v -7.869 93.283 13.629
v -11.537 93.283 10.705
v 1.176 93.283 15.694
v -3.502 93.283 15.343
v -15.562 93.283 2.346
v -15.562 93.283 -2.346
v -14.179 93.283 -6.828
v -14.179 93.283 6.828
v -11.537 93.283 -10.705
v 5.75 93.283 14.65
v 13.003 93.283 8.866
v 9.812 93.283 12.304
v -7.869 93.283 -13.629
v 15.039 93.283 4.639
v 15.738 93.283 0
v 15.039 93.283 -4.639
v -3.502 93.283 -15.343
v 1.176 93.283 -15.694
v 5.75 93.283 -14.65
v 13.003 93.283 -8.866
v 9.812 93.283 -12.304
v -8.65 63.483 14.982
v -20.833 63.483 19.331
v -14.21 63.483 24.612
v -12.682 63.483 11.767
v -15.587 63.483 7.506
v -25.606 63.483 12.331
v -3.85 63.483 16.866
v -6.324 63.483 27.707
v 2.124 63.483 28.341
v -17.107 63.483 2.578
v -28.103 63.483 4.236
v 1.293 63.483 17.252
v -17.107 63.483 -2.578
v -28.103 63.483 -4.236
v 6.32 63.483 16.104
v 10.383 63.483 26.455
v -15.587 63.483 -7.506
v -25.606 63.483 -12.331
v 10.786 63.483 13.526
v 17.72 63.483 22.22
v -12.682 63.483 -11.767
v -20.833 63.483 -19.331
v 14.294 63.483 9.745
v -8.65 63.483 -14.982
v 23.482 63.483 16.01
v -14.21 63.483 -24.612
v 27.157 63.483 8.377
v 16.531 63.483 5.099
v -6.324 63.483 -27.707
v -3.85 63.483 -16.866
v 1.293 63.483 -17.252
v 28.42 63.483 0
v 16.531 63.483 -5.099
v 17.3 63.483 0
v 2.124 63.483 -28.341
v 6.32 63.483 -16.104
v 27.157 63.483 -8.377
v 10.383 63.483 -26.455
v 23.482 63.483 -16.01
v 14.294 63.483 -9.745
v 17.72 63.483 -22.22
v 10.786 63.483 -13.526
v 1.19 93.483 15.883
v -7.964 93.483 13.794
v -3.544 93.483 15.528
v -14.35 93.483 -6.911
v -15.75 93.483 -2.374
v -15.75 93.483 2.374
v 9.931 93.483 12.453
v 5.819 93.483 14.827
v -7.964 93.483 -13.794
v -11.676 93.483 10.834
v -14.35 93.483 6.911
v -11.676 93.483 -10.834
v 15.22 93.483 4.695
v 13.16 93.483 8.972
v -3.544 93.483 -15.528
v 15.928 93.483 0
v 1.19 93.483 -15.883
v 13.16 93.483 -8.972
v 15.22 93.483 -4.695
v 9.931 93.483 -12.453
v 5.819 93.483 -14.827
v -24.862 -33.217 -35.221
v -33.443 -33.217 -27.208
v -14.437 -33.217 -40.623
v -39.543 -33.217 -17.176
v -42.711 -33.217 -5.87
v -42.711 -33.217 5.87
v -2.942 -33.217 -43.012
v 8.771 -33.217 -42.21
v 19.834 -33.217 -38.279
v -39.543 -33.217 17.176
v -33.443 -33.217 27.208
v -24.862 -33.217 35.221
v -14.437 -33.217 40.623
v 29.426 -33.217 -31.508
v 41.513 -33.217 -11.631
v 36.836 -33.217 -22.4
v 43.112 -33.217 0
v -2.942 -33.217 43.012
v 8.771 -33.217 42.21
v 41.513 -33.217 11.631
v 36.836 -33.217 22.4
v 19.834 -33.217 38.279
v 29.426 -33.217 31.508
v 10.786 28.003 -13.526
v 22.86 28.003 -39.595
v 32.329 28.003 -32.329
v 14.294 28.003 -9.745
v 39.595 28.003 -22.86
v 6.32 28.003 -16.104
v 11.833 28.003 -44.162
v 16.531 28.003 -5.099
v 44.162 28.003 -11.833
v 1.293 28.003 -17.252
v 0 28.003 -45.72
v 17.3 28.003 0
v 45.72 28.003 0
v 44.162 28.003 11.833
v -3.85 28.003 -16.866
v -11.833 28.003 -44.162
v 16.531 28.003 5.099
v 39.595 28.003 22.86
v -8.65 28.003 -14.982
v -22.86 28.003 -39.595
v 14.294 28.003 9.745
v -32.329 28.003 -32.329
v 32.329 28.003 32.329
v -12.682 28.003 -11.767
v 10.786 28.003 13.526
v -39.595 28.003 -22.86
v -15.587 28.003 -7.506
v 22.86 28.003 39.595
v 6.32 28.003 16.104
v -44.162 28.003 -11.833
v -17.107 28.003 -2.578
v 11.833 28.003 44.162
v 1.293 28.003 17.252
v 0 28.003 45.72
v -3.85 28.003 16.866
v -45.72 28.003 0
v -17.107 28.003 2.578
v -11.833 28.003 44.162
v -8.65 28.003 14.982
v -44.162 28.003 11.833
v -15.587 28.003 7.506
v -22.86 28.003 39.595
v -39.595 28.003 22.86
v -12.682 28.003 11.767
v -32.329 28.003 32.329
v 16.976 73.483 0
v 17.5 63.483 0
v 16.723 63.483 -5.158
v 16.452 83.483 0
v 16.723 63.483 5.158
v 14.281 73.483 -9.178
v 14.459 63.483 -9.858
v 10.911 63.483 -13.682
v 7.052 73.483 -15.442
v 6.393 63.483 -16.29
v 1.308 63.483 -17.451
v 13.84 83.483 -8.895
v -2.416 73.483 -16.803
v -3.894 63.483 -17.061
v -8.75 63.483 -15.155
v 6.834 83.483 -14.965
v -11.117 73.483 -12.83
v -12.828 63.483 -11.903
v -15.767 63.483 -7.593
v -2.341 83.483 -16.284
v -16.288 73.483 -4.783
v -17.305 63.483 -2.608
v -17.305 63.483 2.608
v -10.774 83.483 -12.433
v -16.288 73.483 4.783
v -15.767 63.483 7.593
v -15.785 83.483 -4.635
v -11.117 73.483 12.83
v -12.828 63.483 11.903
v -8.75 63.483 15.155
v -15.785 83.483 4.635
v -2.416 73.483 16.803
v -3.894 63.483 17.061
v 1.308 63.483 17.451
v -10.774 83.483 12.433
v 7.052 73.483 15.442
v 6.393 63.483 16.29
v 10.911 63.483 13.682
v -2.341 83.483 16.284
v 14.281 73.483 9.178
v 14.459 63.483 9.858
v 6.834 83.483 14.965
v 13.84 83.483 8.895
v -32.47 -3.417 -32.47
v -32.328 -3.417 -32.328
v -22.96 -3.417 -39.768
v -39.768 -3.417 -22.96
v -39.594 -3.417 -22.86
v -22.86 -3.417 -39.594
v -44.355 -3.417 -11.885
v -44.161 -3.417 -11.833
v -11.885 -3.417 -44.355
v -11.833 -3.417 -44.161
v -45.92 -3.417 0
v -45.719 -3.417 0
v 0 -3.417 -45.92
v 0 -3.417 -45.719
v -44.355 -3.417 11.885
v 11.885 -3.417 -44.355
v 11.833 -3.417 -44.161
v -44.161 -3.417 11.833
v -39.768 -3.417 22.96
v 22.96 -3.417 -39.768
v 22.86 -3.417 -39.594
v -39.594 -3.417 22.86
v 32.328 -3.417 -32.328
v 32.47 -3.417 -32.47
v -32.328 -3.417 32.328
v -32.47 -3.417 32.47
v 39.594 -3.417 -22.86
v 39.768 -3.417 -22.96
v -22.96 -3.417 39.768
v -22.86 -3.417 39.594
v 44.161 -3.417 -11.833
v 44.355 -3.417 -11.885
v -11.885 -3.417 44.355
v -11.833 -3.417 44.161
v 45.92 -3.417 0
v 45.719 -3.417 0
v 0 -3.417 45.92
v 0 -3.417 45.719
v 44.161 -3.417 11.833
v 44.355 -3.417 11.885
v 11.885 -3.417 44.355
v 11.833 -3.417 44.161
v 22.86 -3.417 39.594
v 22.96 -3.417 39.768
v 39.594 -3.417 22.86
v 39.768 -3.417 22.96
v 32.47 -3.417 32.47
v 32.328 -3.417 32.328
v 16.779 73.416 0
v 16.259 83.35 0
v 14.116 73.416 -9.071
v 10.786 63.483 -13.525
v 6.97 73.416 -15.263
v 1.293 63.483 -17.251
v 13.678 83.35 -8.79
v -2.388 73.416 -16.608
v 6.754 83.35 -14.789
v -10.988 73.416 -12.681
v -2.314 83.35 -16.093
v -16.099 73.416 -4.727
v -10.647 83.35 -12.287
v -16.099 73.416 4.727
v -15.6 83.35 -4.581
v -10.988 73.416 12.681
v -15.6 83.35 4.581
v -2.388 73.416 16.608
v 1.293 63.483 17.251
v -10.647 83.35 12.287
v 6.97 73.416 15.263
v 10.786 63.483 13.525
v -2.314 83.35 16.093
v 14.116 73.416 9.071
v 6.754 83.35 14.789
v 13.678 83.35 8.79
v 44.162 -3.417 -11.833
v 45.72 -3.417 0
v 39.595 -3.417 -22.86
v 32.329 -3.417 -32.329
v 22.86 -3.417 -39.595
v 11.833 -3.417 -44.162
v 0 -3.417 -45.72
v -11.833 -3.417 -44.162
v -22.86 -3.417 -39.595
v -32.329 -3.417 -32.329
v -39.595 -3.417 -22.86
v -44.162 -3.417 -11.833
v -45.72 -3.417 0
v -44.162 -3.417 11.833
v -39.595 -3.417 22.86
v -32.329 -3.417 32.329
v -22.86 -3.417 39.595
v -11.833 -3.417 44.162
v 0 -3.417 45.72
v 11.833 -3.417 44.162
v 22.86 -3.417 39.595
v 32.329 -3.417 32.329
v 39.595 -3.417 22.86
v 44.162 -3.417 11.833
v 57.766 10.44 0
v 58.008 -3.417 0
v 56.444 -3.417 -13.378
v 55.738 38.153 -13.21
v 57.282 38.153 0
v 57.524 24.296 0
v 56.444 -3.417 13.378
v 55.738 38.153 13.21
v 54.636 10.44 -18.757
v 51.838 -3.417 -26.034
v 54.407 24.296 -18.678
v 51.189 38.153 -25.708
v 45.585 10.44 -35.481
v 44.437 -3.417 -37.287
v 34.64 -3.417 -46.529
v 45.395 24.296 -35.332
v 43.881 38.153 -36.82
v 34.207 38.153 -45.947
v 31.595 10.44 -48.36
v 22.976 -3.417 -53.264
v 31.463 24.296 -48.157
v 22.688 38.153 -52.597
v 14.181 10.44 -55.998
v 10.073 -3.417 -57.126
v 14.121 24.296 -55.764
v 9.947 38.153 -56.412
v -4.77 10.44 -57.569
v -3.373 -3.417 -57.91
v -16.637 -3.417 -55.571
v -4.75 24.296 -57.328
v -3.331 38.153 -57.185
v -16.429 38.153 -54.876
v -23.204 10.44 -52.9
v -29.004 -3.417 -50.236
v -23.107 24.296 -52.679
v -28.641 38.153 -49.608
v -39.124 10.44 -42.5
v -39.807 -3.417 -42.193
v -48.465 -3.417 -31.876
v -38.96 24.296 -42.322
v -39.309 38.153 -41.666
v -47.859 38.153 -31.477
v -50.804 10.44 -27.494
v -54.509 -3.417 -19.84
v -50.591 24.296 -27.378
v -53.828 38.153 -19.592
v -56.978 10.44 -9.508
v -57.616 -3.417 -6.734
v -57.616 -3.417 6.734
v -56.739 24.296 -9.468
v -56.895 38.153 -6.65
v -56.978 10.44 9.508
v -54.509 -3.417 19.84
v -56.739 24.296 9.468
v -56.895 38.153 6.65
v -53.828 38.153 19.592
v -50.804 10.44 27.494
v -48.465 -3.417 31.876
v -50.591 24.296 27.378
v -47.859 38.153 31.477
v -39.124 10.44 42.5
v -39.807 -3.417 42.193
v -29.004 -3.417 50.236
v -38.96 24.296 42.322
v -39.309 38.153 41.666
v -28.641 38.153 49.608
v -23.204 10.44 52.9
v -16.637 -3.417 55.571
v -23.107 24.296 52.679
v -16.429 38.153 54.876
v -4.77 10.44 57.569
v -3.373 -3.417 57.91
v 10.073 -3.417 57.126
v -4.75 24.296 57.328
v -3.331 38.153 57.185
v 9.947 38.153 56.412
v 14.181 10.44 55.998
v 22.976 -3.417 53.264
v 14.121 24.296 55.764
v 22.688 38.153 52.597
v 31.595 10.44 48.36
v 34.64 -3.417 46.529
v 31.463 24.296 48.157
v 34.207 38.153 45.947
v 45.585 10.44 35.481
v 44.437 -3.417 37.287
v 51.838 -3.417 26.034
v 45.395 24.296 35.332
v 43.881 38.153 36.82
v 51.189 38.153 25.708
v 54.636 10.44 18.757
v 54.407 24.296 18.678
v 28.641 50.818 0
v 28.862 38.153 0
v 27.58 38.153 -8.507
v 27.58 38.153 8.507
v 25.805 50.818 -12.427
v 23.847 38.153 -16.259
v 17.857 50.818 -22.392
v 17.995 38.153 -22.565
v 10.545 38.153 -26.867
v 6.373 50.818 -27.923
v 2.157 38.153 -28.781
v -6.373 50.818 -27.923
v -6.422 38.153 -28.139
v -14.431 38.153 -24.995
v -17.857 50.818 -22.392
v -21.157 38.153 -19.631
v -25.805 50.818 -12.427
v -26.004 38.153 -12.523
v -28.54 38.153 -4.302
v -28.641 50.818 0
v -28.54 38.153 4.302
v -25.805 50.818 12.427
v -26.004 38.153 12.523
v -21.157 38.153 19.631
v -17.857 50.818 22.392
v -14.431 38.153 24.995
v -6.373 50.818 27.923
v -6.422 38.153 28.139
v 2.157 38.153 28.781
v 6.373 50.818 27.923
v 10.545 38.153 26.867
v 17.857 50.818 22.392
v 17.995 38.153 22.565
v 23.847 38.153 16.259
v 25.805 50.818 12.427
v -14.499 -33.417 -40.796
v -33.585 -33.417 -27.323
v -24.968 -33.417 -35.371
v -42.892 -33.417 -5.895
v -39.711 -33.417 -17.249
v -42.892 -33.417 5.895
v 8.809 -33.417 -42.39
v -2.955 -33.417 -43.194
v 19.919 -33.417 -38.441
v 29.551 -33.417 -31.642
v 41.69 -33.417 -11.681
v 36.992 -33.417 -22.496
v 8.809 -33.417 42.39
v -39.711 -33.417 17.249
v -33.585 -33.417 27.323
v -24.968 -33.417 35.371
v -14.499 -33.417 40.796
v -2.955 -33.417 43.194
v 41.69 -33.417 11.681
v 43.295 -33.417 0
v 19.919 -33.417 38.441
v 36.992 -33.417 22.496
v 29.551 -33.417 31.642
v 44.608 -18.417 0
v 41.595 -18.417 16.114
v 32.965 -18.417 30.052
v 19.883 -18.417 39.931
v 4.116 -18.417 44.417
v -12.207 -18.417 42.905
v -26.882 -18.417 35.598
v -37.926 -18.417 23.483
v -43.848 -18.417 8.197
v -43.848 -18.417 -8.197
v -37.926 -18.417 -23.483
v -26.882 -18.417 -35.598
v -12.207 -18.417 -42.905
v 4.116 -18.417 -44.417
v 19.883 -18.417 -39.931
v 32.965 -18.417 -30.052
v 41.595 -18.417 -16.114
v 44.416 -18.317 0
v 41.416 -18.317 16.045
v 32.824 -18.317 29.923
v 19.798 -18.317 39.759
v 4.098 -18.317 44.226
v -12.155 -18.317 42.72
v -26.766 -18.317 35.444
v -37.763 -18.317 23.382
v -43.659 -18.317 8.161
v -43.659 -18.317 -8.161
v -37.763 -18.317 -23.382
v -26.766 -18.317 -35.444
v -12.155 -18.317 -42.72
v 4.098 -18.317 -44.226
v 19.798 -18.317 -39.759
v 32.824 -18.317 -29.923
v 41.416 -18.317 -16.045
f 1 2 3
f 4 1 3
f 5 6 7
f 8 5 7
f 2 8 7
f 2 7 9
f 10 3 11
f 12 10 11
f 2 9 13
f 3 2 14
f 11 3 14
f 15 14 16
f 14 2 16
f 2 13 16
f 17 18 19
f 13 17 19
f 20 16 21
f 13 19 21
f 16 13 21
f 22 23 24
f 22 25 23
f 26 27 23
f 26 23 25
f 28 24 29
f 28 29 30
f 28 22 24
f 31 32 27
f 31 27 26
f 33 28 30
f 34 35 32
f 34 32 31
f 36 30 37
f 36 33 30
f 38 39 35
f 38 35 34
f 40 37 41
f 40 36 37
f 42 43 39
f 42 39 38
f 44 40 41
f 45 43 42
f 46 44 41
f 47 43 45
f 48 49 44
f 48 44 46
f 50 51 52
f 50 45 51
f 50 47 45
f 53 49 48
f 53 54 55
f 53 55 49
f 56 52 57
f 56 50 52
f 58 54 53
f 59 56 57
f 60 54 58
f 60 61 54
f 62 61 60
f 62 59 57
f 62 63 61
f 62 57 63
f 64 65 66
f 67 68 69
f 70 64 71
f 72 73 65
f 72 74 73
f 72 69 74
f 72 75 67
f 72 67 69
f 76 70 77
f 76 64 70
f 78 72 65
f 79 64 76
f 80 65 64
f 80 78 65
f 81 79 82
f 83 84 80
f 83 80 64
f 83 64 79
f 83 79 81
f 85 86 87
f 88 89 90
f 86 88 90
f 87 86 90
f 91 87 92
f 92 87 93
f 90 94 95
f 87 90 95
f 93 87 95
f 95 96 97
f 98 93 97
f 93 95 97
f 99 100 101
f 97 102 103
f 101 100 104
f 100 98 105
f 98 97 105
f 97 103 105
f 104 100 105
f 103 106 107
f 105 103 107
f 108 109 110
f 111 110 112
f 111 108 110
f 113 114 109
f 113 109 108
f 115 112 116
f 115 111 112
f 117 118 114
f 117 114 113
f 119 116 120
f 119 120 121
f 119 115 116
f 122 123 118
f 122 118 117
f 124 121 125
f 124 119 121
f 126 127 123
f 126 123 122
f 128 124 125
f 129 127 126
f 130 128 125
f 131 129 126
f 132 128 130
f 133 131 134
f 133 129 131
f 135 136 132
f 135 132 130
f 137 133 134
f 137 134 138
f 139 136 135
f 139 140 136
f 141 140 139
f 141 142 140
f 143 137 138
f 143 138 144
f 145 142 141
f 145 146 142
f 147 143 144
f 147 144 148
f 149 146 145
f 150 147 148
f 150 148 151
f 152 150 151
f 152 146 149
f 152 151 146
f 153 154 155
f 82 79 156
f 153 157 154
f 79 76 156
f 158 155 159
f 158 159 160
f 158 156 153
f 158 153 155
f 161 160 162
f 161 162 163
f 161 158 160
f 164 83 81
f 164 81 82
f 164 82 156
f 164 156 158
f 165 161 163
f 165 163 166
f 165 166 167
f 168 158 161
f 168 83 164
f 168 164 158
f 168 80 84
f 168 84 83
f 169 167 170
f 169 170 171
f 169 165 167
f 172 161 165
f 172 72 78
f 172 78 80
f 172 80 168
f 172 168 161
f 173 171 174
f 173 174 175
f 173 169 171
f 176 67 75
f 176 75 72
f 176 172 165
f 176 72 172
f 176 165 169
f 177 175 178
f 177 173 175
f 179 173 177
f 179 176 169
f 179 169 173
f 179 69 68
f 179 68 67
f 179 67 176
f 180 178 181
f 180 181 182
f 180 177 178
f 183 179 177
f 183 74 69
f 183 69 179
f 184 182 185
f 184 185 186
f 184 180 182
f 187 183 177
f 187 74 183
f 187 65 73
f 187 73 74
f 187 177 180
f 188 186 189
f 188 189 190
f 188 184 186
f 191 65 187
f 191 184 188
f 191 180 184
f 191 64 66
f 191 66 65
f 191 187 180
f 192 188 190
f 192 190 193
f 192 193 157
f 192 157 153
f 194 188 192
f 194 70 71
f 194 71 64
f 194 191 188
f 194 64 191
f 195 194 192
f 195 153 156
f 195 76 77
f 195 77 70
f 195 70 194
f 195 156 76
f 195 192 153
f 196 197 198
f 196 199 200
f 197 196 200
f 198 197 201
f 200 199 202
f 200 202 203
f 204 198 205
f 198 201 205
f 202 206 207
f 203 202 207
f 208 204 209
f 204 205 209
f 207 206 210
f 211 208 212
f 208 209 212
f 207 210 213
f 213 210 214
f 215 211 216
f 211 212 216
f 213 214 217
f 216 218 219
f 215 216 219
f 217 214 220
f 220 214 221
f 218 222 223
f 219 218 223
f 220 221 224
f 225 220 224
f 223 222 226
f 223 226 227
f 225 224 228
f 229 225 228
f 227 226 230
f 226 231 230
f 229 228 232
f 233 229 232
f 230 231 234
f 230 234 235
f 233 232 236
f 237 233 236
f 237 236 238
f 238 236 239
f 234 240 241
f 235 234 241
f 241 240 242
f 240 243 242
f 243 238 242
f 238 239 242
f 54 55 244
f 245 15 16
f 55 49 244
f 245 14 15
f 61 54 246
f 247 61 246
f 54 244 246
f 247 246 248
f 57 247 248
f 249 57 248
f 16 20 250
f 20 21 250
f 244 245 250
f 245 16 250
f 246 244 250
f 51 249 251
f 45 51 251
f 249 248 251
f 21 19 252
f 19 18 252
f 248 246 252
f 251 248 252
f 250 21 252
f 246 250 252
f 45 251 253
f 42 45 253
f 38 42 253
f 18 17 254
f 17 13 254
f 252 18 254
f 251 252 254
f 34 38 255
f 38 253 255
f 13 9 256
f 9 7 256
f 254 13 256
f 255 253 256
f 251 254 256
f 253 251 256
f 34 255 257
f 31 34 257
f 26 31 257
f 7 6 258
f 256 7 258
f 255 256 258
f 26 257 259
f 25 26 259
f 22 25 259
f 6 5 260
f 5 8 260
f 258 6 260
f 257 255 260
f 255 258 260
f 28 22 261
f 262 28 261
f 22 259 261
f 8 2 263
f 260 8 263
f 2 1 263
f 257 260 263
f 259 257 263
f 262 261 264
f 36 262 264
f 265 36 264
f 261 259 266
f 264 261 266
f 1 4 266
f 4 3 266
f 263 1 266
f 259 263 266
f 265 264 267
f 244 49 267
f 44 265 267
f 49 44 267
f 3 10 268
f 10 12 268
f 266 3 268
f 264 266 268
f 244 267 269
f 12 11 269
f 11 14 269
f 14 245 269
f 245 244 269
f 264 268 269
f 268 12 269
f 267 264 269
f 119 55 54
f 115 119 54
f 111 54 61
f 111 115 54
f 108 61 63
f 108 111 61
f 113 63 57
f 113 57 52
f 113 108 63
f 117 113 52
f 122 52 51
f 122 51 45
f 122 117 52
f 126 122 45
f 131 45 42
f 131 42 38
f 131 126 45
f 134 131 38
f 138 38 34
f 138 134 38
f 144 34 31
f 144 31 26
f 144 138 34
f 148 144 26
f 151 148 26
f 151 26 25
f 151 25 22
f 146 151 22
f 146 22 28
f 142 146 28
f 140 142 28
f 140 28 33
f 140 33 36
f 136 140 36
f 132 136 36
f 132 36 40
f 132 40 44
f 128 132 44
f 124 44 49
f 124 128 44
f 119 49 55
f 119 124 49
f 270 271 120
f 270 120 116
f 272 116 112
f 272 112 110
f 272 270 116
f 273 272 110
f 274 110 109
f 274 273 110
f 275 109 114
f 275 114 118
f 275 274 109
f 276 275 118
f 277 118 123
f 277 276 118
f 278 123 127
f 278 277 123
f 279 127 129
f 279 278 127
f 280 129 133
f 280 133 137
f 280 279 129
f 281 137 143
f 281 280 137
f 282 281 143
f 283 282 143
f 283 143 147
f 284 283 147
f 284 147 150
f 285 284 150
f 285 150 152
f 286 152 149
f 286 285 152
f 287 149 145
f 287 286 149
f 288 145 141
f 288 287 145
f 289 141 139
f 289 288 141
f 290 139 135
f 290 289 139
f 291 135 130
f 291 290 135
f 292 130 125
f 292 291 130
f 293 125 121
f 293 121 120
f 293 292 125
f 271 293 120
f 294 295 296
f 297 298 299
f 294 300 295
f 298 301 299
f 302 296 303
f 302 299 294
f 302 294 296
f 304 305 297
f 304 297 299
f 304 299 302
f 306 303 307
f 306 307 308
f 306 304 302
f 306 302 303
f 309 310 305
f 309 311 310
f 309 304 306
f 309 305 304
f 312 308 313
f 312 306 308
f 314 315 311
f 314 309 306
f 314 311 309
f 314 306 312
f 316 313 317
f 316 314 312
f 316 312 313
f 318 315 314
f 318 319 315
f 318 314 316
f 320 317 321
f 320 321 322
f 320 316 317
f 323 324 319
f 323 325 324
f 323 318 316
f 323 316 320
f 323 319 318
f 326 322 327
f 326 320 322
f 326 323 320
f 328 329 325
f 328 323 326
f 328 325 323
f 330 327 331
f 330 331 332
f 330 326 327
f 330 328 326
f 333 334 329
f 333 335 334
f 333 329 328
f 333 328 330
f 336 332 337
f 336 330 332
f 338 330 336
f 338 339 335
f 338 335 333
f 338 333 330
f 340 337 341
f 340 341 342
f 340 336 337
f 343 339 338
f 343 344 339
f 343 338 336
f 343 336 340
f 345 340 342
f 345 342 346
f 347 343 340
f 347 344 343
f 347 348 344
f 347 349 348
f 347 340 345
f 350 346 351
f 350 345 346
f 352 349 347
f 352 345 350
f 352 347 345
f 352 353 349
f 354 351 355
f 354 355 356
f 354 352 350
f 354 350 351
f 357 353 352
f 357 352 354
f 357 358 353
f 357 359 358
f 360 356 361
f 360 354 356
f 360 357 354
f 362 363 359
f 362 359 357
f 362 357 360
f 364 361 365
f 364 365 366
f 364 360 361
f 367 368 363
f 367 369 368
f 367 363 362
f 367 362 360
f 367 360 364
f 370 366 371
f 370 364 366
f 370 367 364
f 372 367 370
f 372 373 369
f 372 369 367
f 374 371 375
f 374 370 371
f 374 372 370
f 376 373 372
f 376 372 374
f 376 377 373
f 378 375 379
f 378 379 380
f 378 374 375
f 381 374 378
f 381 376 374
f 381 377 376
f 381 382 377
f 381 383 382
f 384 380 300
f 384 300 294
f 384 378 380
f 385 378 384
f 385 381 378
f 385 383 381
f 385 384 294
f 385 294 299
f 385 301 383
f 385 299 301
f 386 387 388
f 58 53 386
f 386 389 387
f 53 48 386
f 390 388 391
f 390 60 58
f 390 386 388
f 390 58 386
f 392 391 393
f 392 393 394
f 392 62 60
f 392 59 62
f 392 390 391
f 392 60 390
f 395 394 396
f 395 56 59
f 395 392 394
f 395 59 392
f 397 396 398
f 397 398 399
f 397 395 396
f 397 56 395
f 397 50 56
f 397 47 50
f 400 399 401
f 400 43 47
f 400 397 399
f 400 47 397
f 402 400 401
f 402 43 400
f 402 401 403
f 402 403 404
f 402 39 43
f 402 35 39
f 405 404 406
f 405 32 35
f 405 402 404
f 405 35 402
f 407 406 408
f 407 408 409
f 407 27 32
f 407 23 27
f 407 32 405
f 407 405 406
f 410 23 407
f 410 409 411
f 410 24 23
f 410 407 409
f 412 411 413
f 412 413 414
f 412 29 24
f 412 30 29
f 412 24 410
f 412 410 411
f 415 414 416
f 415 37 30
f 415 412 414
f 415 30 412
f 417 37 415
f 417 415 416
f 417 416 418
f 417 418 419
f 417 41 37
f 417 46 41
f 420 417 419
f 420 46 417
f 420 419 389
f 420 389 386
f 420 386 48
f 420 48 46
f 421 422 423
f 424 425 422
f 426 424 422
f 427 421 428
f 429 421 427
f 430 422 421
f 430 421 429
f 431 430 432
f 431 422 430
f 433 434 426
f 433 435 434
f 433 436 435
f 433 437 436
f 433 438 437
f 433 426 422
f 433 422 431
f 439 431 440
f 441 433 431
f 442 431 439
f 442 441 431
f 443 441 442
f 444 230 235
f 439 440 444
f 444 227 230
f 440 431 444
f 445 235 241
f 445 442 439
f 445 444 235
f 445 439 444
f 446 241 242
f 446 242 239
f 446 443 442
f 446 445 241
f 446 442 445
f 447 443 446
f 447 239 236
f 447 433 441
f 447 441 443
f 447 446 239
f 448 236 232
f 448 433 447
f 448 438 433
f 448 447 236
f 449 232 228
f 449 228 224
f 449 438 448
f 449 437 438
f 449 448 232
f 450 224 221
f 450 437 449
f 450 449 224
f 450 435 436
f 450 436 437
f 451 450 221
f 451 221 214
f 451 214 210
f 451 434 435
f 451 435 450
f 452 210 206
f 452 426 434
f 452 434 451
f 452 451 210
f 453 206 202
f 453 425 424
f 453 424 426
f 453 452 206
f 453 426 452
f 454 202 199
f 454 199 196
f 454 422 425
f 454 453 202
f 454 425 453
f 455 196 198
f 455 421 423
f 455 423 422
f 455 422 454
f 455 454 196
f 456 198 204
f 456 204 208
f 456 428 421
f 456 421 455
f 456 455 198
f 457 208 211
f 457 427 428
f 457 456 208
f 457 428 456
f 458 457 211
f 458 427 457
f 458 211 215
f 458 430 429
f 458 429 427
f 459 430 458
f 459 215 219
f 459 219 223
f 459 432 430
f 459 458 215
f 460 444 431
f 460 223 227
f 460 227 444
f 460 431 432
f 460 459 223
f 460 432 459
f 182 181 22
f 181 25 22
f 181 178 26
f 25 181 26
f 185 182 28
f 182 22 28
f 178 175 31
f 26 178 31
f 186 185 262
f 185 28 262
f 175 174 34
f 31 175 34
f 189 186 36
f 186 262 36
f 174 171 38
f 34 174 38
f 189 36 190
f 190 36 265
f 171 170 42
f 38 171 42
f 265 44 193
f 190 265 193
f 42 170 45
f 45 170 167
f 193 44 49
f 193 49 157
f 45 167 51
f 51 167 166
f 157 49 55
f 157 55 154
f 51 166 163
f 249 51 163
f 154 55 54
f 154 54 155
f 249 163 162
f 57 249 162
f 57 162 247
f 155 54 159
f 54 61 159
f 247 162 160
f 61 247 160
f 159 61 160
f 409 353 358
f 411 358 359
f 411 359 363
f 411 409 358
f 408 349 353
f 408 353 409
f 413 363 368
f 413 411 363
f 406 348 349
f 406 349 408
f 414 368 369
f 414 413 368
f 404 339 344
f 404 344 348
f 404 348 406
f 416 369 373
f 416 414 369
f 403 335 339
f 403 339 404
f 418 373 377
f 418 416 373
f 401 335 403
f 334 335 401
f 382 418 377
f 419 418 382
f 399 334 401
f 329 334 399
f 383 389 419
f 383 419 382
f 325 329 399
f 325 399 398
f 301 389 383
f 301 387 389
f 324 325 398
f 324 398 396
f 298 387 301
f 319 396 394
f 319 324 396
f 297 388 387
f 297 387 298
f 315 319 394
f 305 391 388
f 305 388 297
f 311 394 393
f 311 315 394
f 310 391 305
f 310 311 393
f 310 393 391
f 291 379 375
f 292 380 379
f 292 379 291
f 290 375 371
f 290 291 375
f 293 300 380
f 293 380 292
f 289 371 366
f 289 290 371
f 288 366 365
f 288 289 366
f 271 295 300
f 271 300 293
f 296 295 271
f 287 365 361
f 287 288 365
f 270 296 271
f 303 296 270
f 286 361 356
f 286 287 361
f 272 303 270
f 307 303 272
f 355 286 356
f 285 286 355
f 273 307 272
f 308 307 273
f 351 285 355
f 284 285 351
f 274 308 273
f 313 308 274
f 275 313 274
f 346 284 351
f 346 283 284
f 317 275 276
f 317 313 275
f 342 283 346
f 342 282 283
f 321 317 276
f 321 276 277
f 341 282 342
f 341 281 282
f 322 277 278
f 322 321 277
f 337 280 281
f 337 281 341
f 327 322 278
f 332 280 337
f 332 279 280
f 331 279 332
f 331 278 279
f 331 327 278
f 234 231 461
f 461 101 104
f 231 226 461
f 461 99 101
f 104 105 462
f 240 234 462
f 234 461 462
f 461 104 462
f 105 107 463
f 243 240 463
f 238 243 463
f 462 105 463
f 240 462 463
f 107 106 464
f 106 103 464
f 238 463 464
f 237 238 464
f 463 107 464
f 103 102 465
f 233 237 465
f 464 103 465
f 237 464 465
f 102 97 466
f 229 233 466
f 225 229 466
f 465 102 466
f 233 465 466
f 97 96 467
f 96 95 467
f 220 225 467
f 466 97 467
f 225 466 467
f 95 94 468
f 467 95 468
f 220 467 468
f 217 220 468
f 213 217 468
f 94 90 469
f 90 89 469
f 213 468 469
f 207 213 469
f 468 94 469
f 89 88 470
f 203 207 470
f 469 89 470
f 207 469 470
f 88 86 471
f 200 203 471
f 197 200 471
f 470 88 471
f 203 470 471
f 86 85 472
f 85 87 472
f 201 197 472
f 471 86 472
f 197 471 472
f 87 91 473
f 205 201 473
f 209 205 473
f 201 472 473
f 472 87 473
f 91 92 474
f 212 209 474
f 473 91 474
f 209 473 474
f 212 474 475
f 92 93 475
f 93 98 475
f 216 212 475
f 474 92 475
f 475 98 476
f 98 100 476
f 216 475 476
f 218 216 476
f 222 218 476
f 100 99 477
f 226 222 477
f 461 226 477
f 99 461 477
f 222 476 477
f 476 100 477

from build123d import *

# Parameters (mm, degrees)
SCALE1_SCALE             = 1.015
MOVE_START               = -3.416970763
MOVE_FACE1_OUTLINE_R     = 56.84
MOVE_FACE1_OUTLINE_R_2   = 45.72
MOVE_FACE1_DEPTH         = 31.42
MOVE_START_2             = 28.003029237
MOVE_FACE1_2_OUTLINE_R   = 28.42
MOVE_FACE1_2_OUTLINE_R_2 = 17.3
MOVE_FACE1_2_DEPTH       = 35.48
SKETCH2_R                = 17.5
BOSS_EXTRUDE1_DEPTH      = 30
BOSS_EXTRUDE1_TAPER      = 3
SKETCH3_R                = 45.92
BOSS_EXTRUDE2_DEPTH      = 30
BOSS_EXTRUDE2_TAPER      = 5
SHELL1_T                 = -0.2
SHELL2_T                 = -0.2


# Read off the part's stored shape, not the designer's step: Move Face1, Draft1
with BuildPart() as part:
    # Sketch1 → Revolve1 (revolve)
    with BuildSketch(Plane.XY, mode=Mode.PRIVATE) as revolve1_sk:
        Polygon((56, 0), (48, 0), (48, 28), (20, 28), (20, 60), (28, 60), (28, 38), (56, 38), align=None)
    revolve(revolve1_sk.sketch.rotate(Axis((0, 93.493183641, 0), (0, -1, 0)), 90), axis=Axis((0, 93.493183641, 0), (0, -1, 0)))


with BuildPart() as part_1:
    # Scale1: scaled about (0, 27.798050893, 0)
    add(part.part.scale(SCALE1_SCALE).moved(Location((0, -0.416970763, 0))))

    # Move Face1 outline → Move Face1 (add)
    with BuildSketch(Plane(origin=(0, 0, 0), x_dir=(1, 0, 0), z_dir=(0, 1, 0)).offset(MOVE_START)):
        Circle(MOVE_FACE1_OUTLINE_R)
        Circle(MOVE_FACE1_OUTLINE_R_2, mode=Mode.SUBTRACT)
    extrude(amount=MOVE_FACE1_DEPTH)

    # Move Face1 2 outline → Move Face1 2 (add)
    with BuildSketch(Plane(origin=(0, 0, 0), x_dir=(1, 0, 0), z_dir=(0, 1, 0)).offset(MOVE_START_2)):
        Circle(MOVE_FACE1_2_OUTLINE_R)
        Circle(MOVE_FACE1_2_OUTLINE_R_2, mode=Mode.SUBTRACT)
    extrude(amount=MOVE_FACE1_2_DEPTH)

    # Draft1 outline → Draft1 (revolve)
    with BuildSketch(Plane.XY):
        Polygon((56.84, -3.416970763), (58.007743844, -3.416970763), (57.282136795, 38.153029237), (56.84, 38.153029237), align=None)
        Polygon((28.42, 38.153029237), (28.862136795, 38.153029237), (28.42, 63.483029237), align=None)
    revolve(axis=Axis((0, 0, 0), (0, 1, 0)))


with BuildPart() as body_2:
    # Sketch2 → Boss-Extrude1 (new body)
    with BuildSketch(Plane(origin=(0, 63.483029237, 0), x_dir=(1, 0, 0), z_dir=(0, 1, 0))):
        Circle(SKETCH2_R)
    extrude(amount=BOSS_EXTRUDE1_DEPTH, taper=BOSS_EXTRUDE1_TAPER)

    # Shell1
    shell1_openings = [body_2.faces().sort_by_distance(p)[0] for p in [
        (0, 63.483029237, 0),
    ]]
    offset(amount=SHELL1_T, openings=shell1_openings, kind=Kind.INTERSECTION)


with BuildPart() as body_3:
    # Sketch3 → Boss-Extrude2 (new body)
    with BuildSketch(Plane.XZ.offset(3.416970763)):
        Circle(SKETCH3_R)
    extrude(amount=BOSS_EXTRUDE2_DEPTH, taper=BOSS_EXTRUDE2_TAPER)

    # Shell2
    shell2_openings = [body_3.faces().sort_by_distance(p)[0] for p in [
        (0, -3.416970763, 0),
    ]]
    offset(amount=SHELL2_T, openings=shell2_openings, kind=Kind.INTERSECTION)


solid = Compound([part_1.part, body_2.part, body_3.part])
